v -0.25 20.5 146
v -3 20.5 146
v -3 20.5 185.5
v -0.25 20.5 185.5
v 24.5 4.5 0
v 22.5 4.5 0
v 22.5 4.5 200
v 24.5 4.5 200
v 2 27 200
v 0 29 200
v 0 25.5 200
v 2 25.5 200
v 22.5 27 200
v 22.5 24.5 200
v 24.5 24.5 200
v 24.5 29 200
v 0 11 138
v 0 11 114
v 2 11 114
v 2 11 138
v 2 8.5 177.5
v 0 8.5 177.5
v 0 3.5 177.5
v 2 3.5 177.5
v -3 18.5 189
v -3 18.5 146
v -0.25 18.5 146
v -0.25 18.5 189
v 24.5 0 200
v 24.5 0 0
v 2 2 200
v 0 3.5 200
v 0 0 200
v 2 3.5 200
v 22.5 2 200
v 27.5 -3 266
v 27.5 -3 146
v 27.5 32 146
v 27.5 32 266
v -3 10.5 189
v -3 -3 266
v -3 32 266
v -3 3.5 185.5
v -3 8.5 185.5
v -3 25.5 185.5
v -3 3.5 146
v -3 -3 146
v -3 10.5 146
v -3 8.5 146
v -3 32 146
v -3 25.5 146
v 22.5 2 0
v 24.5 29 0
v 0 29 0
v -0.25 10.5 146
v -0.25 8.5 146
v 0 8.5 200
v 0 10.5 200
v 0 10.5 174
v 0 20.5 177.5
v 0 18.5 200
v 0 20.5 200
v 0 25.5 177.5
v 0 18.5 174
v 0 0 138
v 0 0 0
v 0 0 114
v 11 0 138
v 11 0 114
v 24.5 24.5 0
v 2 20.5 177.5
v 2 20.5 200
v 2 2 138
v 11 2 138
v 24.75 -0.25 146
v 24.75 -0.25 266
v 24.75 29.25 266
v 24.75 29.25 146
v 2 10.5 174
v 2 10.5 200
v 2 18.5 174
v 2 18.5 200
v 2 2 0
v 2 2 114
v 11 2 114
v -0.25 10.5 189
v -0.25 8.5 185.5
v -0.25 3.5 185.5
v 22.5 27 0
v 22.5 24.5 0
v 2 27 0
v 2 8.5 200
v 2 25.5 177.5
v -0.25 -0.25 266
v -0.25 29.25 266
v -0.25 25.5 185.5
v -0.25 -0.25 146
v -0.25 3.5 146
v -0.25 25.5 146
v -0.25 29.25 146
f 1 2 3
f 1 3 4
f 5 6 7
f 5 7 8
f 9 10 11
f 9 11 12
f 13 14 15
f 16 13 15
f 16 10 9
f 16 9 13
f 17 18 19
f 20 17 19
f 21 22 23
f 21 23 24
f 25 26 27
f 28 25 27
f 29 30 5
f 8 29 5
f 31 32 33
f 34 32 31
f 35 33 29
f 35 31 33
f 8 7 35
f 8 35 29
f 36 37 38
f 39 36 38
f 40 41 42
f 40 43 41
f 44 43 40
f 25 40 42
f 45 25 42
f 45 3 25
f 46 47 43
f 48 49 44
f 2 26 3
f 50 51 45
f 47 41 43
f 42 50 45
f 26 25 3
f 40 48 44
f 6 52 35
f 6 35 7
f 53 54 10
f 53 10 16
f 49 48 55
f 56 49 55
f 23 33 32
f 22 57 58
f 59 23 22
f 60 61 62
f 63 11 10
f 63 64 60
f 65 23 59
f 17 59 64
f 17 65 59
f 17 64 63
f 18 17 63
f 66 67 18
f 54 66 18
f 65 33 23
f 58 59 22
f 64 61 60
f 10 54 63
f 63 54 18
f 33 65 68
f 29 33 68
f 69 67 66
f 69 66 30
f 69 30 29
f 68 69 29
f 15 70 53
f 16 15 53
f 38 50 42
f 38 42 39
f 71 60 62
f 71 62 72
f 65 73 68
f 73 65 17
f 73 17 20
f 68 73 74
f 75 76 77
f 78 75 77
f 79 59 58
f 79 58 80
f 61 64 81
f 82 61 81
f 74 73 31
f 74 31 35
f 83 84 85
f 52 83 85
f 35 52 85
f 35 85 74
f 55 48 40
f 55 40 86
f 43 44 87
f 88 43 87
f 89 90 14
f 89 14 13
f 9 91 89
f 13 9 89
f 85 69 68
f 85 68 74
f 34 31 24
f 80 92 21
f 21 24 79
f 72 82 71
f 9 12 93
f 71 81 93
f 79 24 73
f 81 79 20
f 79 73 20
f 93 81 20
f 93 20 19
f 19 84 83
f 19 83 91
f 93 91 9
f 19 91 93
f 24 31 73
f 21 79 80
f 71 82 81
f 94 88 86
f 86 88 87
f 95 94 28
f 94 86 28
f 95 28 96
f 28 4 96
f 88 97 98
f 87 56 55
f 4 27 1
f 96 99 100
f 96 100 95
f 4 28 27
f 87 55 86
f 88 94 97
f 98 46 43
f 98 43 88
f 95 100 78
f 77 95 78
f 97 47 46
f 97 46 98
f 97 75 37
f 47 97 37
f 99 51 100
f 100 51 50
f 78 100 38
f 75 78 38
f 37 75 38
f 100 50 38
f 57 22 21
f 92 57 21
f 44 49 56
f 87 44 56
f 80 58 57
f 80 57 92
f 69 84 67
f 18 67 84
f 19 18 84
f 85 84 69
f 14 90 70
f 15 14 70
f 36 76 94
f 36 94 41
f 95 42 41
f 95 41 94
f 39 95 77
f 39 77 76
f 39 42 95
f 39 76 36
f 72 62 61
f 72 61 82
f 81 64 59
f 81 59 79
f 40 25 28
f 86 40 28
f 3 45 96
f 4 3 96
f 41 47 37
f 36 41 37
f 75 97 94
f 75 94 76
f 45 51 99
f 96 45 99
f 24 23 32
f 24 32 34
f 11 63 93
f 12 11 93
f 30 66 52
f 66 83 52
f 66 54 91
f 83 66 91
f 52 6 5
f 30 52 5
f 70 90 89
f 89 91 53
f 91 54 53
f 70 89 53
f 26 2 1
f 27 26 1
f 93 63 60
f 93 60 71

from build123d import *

# Parameters (mm, degrees)
BOX006_W     = 16
BOX006_H     = 5
BOX006_DEPTH = 34
BOX005_W     = 16
BOX005_H     = 5
BOX005_DEPTH = 34
BOX004_W     = 16
BOX004_H     = 8
BOX004_DEPTH = 34
BOX003_W     = 12
BOX003_H     = 12
BOX003_DEPTH = 24
BOX001_W     = 20.5
BOX001_H     = 25
BOX001_DEPTH = 202
BOX002_W     = 24.5
BOX002_H     = 20
BOX002_DEPTH = 200
BOX_W        = 24.5
BOX_H        = 29
BOX_DEPTH    = 200
BOX014_W     = 16
BOX014_H     = 5
BOX014_DEPTH = 48
BOX013_W     = 16
BOX013_H     = 5
BOX013_DEPTH = 47
BOX012_W     = 16
BOX012_H     = 8
BOX012_DEPTH = 52
BOX008_W     = 25
BOX008_H     = 29.5
BOX008_DEPTH = 200
BOX007_W     = 30.5
BOX007_H     = 35
BOX007_DEPTH = 120


with BuildPart() as cube006:
    # Box006 → Box006 (new body)
    with BuildSketch(Plane(origin=(-2, 20.5, 177.5), x_dir=(1, 0, 0), z_dir=(0, 0, 1))):
        with Locations((8, 2.5)):
            Rectangle(BOX006_W, BOX006_H)
    extrude(amount=BOX006_DEPTH)


with BuildPart() as cube005:
    # Box005 → Box005 (new body)
    with BuildSketch(Plane(origin=(-2, 3.5, 177.5), x_dir=(1, 0, 0), z_dir=(0, 0, 1))):
        with Locations((8, 2.5)):
            Rectangle(BOX005_W, BOX005_H)
    extrude(amount=BOX005_DEPTH)


with BuildPart() as slots:
    # Box004 → Box004 (new body)
    with BuildSketch(Plane(origin=(-2, 10.5, 174), x_dir=(1, 0, 0), z_dir=(0, 0, 1))):
        with Locations((8, 4)):
            Rectangle(BOX004_W, BOX004_H)
    extrude(amount=BOX004_DEPTH)

    # Fusion001: union Cube006, Cube005
    add(cube006.part)
    add(cube005.part)


with BuildPart() as cube003:
    # Box003 → Box003 (new body)
    with BuildSketch(Plane(origin=(-1, -1, 114), x_dir=(1, 0, 0), z_dir=(0, 0, 1))):
        with Locations((6, 6)):
            Rectangle(BOX003_W, BOX003_H)
    extrude(amount=BOX003_DEPTH)


with BuildPart() as cube001:
    # Box001 → Box001 (new body)
    with BuildSketch(Plane(origin=(2, 2, -1), x_dir=(1, 0, 0), z_dir=(0, 0, 1))):
        with Locations((10.25, 12.5)):
            Rectangle(BOX001_W, BOX001_H)
    extrude(amount=BOX001_DEPTH)


with BuildPart() as fusion:
    # Box002 → Box002 (new body)
    with BuildSketch(Plane(origin=(6, 4.5, 0), x_dir=(1, 0, 0), z_dir=(0, 0, 1))):
        with Locations((12.25, 10)):
            Rectangle(BOX002_W, BOX002_H)
    extrude(amount=BOX002_DEPTH)

    # Fusion: union Cube001
    add(cube001.part)


with BuildPart() as cut002:
    # Box → Box (new body)
    with BuildSketch(Plane.XY):
        with Locations((12.25, 14.5)):
            Rectangle(BOX_W, BOX_H)
    extrude(amount=BOX_DEPTH)

    # Cut: cut Fusion
    add(fusion.part, mode=Mode.SUBTRACT)

    # Cut001: cut Cube003
    add(cube003.part, mode=Mode.SUBTRACT)

    # Cut002: cut slots
    add(slots.part, mode=Mode.SUBTRACT)


with BuildPart() as cube014:
    # Box014 → Box014 (new body)
    with BuildSketch(Plane(origin=(-5, 3.5, 137.5), x_dir=(1, 0, 0), z_dir=(0, 0, 1))):
        with Locations((8, 2.5)):
            Rectangle(BOX014_W, BOX014_H)
    extrude(amount=BOX014_DEPTH)


with BuildPart() as cube013:
    # Box013 → Box013 (new body)
    with BuildSketch(Plane(origin=(-5, 20.5, 138.5), x_dir=(1, 0, 0), z_dir=(0, 0, 1))):
        with Locations((8, 2.5)):
            Rectangle(BOX013_W, BOX013_H)
    extrude(amount=BOX013_DEPTH)


with BuildPart() as bigslots:
    # Box012 → Box012 (new body)
    with BuildSketch(Plane(origin=(-5, 10.5, 137), x_dir=(1, 0, 0), z_dir=(0, 0, 1))):
        with Locations((8, 4)):
            Rectangle(BOX012_W, BOX012_H)
    extrude(amount=BOX012_DEPTH)

    # Fusion002: union Cube014, Cube013
    add(cube014.part)
    add(cube013.part)


with BuildPart() as cube008:
    # Box008 → Box008 (new body)
    with BuildSketch(Plane(origin=(-0.25, -0.25, 190), x_dir=(1, 0, 0), z_dir=(0, 0, 1))):
        with Locations((12.5, 14.75)):
            Rectangle(BOX008_W, BOX008_H)
    extrude(amount=BOX008_DEPTH)


with BuildPart() as cut004:
    # Box007 → Box007 (new body)
    with BuildSketch(Plane(origin=(-3, -3, 200), x_dir=(1, 0, 0), z_dir=(0, 0, 1))):
        with Locations((15.25, 17.5)):
            Rectangle(BOX007_W, BOX007_H)
    extrude(amount=BOX007_DEPTH)

    # Cut003: cut Cube008
    add(cube008.part, mode=Mode.SUBTRACT)


with BuildPart() as cut004_1:
    # Cut003 placement: moved
    add(cut004.part.moved(Location((0, 0, -54))))

    # Cut004: cut bigslots
    add(bigslots.part, mode=Mode.SUBTRACT)


solid = Compound([cut002.part, cut004_1.part])
